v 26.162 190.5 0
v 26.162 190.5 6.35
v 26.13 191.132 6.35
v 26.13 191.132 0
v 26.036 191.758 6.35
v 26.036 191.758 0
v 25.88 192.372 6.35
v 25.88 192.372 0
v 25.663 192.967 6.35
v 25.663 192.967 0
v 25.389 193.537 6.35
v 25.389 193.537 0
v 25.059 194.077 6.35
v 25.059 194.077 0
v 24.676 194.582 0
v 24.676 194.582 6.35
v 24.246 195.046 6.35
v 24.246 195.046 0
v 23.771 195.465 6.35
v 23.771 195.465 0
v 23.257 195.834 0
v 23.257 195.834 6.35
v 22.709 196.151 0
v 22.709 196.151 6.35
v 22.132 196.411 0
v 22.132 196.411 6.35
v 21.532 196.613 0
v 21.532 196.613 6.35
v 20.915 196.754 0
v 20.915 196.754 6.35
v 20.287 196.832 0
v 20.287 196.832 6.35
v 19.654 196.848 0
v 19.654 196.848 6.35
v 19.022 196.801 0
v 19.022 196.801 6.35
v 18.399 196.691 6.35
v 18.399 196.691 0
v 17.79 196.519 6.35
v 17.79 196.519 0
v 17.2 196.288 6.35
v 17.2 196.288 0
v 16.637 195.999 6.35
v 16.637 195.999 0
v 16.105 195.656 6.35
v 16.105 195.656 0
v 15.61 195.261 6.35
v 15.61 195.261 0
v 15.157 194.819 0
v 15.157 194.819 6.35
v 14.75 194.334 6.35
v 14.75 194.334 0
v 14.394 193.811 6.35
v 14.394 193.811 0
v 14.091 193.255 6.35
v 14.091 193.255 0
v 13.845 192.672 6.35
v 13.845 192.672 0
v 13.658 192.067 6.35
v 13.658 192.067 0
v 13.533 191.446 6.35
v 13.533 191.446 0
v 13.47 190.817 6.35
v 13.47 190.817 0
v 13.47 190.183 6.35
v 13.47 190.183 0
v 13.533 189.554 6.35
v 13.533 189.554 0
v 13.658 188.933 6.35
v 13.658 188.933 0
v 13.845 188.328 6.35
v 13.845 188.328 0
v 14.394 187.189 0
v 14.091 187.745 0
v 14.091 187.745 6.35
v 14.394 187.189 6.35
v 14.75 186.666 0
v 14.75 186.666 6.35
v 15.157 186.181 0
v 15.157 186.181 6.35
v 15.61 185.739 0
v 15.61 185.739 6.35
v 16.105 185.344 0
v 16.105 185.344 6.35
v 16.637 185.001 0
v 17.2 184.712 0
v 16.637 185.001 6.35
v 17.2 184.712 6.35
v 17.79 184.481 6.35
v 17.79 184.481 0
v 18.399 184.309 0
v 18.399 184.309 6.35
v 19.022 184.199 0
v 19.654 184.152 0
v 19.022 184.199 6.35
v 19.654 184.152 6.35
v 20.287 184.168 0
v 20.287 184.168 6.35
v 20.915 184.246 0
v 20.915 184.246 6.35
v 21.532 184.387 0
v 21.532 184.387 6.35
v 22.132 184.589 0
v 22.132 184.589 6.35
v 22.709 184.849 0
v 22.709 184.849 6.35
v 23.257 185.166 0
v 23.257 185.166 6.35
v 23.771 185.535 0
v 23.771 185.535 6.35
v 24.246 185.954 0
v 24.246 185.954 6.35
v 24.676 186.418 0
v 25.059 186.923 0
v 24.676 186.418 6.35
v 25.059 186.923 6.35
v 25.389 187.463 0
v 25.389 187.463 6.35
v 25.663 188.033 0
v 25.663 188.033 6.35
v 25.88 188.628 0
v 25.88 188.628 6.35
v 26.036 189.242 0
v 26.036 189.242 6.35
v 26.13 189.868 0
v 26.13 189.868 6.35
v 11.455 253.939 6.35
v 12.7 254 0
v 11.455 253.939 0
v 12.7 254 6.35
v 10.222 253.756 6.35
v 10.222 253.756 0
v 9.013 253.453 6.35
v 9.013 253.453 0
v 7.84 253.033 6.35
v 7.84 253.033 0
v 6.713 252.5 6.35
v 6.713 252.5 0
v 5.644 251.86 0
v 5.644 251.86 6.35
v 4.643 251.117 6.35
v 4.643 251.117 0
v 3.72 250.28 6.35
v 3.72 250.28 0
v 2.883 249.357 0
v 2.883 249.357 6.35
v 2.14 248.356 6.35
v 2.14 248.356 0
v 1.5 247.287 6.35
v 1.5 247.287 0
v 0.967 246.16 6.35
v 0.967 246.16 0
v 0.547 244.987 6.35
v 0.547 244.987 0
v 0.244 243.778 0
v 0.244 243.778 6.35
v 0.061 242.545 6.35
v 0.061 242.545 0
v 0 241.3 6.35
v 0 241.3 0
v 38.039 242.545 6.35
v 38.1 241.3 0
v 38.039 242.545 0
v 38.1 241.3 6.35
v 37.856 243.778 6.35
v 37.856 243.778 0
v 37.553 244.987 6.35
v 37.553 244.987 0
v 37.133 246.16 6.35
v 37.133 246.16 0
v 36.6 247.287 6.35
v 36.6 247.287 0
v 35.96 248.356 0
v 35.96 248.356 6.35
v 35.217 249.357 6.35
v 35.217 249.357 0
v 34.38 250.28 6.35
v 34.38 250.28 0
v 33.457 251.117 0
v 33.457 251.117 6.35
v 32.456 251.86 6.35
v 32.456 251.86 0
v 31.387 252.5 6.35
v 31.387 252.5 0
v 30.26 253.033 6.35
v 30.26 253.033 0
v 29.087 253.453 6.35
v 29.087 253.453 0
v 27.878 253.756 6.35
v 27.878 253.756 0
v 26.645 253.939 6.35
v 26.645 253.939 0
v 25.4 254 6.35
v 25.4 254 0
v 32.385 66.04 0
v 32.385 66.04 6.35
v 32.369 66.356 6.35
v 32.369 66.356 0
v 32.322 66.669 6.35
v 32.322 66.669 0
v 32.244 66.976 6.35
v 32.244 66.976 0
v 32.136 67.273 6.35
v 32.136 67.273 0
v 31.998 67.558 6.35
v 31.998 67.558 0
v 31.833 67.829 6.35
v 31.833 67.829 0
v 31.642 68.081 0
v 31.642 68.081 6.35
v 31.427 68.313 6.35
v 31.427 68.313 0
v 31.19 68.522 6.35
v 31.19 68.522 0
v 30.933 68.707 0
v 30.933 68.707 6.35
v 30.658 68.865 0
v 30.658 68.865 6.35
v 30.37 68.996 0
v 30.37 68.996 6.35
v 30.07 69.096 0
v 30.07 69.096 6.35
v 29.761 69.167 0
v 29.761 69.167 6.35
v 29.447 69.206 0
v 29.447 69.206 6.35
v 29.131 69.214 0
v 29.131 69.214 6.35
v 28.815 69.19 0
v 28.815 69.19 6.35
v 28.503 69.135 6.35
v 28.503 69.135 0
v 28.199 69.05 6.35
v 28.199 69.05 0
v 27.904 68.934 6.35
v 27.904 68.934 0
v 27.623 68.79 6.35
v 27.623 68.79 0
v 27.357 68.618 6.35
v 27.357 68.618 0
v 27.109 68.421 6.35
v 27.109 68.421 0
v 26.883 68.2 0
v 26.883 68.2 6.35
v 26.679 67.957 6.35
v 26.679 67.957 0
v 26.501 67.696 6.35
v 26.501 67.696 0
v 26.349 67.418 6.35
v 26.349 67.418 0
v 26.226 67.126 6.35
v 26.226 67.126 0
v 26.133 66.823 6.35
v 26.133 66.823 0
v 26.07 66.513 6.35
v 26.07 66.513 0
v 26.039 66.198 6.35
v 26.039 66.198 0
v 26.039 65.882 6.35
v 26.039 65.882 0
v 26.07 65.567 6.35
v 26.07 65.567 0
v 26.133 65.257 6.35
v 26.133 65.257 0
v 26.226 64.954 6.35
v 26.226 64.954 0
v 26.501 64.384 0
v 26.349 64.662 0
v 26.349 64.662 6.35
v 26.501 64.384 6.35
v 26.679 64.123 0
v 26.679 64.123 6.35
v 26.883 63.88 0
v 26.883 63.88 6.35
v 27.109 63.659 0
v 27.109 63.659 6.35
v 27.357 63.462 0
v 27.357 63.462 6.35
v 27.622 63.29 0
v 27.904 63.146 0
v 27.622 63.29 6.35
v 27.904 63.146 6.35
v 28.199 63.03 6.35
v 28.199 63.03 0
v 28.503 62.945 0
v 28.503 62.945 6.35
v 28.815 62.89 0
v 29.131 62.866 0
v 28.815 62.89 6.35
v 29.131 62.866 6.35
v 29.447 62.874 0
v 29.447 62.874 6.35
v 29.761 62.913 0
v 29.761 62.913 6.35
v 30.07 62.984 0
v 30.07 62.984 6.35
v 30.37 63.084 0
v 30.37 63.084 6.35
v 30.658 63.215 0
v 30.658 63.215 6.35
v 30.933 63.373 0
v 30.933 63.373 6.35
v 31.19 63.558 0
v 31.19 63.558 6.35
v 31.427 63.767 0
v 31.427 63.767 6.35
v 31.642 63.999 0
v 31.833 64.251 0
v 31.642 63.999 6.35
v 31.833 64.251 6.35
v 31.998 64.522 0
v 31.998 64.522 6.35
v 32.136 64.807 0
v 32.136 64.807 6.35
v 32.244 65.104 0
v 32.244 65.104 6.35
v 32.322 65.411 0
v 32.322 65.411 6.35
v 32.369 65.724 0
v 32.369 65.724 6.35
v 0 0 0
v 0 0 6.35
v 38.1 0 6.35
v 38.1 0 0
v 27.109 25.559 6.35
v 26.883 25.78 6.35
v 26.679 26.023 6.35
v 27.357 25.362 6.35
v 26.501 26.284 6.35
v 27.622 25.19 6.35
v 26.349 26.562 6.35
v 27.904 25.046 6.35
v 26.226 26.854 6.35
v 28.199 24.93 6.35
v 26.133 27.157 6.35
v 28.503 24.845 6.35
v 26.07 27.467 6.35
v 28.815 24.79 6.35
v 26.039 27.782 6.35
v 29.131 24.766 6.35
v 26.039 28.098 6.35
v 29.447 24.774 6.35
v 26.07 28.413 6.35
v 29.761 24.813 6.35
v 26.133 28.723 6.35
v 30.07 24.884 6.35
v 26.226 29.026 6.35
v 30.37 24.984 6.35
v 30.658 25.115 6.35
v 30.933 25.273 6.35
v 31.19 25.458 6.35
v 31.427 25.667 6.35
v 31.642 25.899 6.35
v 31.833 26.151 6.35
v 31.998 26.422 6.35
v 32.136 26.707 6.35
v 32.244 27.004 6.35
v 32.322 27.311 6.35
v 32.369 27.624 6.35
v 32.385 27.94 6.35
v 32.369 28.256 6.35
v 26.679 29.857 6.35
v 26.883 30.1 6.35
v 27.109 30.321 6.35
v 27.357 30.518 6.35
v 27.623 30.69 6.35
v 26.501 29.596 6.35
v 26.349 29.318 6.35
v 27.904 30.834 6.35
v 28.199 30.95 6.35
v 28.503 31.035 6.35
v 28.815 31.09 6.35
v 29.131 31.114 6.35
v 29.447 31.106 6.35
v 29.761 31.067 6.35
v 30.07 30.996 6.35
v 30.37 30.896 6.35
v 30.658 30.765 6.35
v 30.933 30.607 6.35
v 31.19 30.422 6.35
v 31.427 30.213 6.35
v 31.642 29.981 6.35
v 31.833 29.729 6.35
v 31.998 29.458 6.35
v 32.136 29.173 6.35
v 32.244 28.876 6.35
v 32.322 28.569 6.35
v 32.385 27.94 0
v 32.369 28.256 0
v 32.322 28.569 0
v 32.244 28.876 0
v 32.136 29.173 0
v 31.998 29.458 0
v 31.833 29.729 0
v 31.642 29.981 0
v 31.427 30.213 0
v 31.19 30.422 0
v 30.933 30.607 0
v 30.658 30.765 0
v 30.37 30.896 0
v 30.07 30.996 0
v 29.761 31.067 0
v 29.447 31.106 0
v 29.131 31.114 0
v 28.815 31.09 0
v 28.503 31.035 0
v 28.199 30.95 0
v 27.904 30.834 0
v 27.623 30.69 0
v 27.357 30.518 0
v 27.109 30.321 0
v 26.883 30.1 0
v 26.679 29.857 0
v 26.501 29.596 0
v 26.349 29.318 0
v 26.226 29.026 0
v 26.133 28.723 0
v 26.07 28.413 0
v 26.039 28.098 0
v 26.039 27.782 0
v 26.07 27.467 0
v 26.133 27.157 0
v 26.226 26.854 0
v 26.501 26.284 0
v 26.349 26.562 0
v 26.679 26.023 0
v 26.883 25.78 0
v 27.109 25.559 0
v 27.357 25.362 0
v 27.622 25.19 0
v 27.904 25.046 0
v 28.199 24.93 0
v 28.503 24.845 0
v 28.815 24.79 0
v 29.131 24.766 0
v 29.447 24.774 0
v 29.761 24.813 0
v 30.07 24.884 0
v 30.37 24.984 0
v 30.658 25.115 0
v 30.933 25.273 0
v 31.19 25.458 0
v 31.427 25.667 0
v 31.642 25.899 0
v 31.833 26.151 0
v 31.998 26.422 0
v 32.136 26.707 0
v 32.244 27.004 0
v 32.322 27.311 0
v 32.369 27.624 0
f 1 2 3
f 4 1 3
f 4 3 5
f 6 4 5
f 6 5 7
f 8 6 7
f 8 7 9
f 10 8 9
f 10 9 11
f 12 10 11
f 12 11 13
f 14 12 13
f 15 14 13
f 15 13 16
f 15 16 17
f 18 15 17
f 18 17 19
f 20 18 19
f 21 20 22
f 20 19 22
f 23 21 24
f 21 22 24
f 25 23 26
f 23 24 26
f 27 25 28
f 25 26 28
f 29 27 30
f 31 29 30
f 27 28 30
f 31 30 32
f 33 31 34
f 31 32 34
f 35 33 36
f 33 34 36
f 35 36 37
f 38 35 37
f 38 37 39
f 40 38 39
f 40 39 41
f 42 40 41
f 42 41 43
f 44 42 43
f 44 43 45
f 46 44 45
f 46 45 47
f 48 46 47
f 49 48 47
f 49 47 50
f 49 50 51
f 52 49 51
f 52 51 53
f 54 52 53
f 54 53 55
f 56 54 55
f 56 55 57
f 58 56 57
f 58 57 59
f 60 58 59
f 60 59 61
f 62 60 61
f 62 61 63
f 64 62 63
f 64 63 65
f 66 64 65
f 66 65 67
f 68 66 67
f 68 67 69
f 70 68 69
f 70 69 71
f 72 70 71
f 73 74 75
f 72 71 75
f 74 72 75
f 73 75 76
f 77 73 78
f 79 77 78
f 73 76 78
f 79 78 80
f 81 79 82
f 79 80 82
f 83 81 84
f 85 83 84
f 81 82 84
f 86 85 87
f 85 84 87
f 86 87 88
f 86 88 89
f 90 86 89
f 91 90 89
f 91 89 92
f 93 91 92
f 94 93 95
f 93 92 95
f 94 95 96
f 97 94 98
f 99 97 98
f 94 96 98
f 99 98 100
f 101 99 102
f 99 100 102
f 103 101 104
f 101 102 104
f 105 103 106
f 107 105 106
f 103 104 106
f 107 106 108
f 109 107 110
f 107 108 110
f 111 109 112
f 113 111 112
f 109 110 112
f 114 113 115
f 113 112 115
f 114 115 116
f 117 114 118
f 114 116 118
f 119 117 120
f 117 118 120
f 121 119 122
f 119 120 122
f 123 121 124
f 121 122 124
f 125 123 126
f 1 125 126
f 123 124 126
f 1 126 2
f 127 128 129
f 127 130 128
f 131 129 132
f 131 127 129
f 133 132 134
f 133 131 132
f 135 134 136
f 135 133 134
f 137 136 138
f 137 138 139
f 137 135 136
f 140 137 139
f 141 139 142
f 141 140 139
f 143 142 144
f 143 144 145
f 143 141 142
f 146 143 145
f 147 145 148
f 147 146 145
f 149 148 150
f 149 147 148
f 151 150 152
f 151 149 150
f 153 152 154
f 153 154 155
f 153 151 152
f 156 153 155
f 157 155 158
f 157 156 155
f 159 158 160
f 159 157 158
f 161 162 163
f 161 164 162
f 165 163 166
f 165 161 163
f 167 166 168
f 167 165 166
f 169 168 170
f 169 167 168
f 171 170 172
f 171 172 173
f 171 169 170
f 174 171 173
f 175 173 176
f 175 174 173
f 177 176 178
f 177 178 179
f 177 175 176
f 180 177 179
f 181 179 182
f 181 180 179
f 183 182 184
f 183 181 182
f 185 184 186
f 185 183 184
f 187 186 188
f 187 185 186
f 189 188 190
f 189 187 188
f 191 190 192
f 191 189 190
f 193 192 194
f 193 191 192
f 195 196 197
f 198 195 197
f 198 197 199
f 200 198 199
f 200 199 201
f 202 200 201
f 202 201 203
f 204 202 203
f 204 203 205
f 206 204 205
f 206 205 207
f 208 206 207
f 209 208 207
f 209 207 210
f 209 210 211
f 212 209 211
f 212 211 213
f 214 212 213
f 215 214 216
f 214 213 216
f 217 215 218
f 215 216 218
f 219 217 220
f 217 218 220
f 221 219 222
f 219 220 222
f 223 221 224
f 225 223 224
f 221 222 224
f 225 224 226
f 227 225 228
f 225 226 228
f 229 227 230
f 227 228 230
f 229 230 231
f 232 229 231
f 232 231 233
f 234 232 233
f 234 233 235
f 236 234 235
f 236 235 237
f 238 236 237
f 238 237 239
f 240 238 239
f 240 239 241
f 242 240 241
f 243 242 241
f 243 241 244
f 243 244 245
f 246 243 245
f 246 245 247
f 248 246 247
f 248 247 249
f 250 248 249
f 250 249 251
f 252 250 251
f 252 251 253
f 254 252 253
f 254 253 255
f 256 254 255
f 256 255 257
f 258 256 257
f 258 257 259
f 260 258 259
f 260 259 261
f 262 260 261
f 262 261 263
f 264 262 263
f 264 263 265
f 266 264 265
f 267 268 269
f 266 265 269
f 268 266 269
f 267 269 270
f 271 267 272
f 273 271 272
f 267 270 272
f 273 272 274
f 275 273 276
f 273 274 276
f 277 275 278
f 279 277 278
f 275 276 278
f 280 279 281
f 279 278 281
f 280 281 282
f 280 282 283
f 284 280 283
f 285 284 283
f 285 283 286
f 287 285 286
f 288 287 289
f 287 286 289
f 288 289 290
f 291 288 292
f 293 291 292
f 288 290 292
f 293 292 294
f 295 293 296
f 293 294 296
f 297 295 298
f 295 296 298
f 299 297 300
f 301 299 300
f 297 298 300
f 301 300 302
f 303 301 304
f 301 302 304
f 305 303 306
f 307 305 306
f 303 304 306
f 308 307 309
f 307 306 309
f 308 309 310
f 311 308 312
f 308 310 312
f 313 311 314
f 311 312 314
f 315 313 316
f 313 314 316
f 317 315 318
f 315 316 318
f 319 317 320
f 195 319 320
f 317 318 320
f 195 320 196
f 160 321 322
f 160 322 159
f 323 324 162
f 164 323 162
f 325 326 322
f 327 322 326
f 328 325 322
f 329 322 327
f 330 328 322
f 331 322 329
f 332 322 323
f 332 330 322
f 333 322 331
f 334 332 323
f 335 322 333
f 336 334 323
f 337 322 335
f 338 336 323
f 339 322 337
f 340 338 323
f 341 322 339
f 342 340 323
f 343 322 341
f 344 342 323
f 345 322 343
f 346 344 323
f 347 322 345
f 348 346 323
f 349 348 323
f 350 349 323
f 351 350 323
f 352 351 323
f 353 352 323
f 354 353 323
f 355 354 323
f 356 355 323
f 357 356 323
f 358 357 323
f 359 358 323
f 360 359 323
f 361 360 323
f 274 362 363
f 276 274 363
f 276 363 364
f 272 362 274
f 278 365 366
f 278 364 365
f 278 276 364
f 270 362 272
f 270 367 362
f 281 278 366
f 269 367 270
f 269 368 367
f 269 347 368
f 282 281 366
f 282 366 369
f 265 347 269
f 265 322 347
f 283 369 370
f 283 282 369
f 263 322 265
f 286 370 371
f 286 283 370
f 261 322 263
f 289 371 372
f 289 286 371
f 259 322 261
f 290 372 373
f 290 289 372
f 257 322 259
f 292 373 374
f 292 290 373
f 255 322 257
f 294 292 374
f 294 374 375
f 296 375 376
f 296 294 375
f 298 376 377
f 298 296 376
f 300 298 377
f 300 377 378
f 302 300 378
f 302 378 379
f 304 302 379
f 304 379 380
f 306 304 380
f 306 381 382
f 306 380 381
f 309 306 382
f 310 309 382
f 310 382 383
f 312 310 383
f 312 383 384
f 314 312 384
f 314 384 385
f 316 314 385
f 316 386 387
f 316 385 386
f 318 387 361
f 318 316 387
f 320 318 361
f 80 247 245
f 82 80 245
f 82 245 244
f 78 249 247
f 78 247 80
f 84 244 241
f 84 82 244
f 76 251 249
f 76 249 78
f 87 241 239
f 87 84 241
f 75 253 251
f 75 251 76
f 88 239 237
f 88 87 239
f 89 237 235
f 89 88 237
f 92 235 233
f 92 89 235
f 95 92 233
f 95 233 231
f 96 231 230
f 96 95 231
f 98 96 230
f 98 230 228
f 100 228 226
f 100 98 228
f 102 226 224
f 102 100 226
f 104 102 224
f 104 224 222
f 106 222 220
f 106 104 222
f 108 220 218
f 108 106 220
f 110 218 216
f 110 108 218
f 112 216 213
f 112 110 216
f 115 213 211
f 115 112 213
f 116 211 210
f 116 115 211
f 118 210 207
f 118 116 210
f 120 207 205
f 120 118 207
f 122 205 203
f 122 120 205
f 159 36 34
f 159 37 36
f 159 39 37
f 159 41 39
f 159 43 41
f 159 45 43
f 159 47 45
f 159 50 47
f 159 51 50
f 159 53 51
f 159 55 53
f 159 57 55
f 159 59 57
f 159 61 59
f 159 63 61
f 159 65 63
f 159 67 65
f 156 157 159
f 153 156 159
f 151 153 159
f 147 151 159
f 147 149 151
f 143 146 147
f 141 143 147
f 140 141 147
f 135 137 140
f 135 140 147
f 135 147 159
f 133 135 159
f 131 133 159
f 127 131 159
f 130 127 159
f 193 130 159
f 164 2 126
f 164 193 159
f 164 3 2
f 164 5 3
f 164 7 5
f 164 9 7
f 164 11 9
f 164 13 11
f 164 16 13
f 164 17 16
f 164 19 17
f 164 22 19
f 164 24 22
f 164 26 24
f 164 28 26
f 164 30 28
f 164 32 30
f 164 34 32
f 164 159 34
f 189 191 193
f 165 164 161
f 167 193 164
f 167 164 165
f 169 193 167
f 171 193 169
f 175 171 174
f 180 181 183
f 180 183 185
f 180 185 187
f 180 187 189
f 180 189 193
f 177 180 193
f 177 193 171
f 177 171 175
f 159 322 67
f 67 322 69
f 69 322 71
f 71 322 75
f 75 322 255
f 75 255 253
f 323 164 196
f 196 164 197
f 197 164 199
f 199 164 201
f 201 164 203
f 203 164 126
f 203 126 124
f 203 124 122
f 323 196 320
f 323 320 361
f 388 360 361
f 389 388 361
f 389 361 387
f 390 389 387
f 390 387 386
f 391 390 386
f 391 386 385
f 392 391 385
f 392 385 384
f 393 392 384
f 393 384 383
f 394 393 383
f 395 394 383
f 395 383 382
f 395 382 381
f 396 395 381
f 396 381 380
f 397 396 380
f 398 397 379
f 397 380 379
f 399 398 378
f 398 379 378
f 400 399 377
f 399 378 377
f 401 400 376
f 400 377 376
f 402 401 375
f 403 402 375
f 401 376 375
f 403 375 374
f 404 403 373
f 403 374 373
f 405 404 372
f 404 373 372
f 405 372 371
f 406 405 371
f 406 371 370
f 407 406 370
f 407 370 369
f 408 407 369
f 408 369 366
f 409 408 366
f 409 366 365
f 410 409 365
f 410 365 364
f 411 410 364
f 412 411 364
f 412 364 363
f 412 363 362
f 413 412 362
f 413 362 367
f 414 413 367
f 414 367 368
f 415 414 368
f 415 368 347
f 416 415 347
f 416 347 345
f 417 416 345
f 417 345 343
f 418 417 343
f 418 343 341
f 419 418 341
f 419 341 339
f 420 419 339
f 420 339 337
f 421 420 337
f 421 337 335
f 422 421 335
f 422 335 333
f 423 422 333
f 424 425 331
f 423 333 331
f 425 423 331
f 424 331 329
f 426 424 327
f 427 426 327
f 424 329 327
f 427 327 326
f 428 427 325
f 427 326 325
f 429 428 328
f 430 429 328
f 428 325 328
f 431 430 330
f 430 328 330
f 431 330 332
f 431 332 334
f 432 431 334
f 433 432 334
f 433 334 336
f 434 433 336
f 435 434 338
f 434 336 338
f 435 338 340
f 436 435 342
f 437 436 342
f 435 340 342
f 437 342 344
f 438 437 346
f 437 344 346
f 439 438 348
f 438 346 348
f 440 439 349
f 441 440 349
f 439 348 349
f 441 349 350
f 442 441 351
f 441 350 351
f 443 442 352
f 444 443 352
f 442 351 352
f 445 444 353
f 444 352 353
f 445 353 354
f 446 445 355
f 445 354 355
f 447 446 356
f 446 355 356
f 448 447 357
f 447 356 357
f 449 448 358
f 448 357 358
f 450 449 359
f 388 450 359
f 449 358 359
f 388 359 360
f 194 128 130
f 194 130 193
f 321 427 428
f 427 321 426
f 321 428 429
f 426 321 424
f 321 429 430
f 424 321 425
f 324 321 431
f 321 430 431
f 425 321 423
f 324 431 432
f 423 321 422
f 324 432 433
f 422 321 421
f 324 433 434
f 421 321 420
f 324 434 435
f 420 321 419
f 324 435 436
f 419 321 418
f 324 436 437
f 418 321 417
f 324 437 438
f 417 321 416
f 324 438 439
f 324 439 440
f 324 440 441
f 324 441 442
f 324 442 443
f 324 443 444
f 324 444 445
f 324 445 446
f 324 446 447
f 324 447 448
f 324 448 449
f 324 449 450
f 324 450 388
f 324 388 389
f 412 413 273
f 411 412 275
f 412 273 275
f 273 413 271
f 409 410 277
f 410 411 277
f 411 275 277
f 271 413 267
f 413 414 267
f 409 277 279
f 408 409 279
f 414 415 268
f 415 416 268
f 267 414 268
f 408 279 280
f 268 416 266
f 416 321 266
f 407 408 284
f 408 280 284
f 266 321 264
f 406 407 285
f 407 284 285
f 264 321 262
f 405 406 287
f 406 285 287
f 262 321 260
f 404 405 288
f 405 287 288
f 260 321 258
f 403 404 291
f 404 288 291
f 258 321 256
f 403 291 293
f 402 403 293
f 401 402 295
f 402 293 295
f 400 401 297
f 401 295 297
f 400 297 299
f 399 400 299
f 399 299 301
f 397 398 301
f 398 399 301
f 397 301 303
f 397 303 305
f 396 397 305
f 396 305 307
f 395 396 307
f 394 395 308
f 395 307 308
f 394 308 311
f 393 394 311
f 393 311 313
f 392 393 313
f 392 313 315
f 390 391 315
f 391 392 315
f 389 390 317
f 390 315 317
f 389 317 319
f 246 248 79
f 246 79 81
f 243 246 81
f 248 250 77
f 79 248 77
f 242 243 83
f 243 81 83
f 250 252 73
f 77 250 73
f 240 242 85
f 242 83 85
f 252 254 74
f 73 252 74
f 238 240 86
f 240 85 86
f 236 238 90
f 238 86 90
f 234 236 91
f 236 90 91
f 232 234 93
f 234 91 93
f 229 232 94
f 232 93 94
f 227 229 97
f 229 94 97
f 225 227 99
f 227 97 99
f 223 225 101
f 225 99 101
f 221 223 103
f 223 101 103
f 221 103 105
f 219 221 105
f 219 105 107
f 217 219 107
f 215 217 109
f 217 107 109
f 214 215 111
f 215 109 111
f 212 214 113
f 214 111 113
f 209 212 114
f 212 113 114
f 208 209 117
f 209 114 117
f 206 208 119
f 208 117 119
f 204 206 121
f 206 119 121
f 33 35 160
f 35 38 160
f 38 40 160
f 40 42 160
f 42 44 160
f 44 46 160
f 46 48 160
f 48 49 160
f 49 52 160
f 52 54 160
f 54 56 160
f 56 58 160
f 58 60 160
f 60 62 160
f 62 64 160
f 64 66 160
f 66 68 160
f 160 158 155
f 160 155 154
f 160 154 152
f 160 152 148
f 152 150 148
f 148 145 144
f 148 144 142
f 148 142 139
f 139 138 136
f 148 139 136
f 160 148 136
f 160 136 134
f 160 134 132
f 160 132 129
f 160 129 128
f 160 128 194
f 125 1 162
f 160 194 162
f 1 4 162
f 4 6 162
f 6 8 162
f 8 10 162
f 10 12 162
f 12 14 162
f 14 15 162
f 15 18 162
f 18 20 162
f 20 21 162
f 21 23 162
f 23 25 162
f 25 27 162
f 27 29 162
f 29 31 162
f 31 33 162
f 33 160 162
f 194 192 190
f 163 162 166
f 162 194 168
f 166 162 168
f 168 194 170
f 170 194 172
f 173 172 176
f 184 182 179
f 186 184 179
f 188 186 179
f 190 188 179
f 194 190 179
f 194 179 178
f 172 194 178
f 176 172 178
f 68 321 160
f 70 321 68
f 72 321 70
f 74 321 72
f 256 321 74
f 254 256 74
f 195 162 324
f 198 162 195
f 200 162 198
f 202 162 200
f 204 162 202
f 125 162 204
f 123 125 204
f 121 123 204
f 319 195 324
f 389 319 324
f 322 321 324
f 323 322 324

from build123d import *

# Parameters (mm, degrees)
SKETCH2_W           = 38.1
SKETCH2_H           = 254
BOSS_EXTRUDE1_DEPTH = 6.35
SIDE_EDGE_R         = 12.7
SIDE_EDGE_2_R       = 12.7
SKETCH4_R           = 3.175
SKETCH4_R_2         = 6.35
CUT_EXTRUDE1_DEPTH  = 257.920089717


with BuildPart() as part:
    # Sketch2 → Boss-Extrude1 (new body)
    with BuildSketch(Plane.XY):
        with Locations((19.05, 127)):
            Rectangle(SKETCH2_W, SKETCH2_H)
    extrude(amount=BOSS_EXTRUDE1_DEPTH)

    # Side Edge
    side_edge_edges = [part.edges().sort_by_distance(p)[0] for p in [
        (38.1, 254, 3.175),
    ]]
    fillet(side_edge_edges, radius=SIDE_EDGE_R)

    # Side Edge 2
    side_edge_2_edges = [part.edges().sort_by_distance(p)[0] for p in [
        (0, 254, 3.175),
    ]]
    fillet(side_edge_2_edges, radius=SIDE_EDGE_2_R)

    # Sketch4 → Cut-Extrude1 (cut, through all)
    with BuildSketch(Plane.XY.offset(6.35)):
        with Locations((29.21, 27.94)):
            Circle(SKETCH4_R)
        with Locations((29.21, 66.04)):
            Circle(SKETCH4_R)
        with Locations((19.812, 190.5)):
            Circle(SKETCH4_R_2)
    extrude(amount=-CUT_EXTRUDE1_DEPTH, mode=Mode.SUBTRACT)


solid = part.part
